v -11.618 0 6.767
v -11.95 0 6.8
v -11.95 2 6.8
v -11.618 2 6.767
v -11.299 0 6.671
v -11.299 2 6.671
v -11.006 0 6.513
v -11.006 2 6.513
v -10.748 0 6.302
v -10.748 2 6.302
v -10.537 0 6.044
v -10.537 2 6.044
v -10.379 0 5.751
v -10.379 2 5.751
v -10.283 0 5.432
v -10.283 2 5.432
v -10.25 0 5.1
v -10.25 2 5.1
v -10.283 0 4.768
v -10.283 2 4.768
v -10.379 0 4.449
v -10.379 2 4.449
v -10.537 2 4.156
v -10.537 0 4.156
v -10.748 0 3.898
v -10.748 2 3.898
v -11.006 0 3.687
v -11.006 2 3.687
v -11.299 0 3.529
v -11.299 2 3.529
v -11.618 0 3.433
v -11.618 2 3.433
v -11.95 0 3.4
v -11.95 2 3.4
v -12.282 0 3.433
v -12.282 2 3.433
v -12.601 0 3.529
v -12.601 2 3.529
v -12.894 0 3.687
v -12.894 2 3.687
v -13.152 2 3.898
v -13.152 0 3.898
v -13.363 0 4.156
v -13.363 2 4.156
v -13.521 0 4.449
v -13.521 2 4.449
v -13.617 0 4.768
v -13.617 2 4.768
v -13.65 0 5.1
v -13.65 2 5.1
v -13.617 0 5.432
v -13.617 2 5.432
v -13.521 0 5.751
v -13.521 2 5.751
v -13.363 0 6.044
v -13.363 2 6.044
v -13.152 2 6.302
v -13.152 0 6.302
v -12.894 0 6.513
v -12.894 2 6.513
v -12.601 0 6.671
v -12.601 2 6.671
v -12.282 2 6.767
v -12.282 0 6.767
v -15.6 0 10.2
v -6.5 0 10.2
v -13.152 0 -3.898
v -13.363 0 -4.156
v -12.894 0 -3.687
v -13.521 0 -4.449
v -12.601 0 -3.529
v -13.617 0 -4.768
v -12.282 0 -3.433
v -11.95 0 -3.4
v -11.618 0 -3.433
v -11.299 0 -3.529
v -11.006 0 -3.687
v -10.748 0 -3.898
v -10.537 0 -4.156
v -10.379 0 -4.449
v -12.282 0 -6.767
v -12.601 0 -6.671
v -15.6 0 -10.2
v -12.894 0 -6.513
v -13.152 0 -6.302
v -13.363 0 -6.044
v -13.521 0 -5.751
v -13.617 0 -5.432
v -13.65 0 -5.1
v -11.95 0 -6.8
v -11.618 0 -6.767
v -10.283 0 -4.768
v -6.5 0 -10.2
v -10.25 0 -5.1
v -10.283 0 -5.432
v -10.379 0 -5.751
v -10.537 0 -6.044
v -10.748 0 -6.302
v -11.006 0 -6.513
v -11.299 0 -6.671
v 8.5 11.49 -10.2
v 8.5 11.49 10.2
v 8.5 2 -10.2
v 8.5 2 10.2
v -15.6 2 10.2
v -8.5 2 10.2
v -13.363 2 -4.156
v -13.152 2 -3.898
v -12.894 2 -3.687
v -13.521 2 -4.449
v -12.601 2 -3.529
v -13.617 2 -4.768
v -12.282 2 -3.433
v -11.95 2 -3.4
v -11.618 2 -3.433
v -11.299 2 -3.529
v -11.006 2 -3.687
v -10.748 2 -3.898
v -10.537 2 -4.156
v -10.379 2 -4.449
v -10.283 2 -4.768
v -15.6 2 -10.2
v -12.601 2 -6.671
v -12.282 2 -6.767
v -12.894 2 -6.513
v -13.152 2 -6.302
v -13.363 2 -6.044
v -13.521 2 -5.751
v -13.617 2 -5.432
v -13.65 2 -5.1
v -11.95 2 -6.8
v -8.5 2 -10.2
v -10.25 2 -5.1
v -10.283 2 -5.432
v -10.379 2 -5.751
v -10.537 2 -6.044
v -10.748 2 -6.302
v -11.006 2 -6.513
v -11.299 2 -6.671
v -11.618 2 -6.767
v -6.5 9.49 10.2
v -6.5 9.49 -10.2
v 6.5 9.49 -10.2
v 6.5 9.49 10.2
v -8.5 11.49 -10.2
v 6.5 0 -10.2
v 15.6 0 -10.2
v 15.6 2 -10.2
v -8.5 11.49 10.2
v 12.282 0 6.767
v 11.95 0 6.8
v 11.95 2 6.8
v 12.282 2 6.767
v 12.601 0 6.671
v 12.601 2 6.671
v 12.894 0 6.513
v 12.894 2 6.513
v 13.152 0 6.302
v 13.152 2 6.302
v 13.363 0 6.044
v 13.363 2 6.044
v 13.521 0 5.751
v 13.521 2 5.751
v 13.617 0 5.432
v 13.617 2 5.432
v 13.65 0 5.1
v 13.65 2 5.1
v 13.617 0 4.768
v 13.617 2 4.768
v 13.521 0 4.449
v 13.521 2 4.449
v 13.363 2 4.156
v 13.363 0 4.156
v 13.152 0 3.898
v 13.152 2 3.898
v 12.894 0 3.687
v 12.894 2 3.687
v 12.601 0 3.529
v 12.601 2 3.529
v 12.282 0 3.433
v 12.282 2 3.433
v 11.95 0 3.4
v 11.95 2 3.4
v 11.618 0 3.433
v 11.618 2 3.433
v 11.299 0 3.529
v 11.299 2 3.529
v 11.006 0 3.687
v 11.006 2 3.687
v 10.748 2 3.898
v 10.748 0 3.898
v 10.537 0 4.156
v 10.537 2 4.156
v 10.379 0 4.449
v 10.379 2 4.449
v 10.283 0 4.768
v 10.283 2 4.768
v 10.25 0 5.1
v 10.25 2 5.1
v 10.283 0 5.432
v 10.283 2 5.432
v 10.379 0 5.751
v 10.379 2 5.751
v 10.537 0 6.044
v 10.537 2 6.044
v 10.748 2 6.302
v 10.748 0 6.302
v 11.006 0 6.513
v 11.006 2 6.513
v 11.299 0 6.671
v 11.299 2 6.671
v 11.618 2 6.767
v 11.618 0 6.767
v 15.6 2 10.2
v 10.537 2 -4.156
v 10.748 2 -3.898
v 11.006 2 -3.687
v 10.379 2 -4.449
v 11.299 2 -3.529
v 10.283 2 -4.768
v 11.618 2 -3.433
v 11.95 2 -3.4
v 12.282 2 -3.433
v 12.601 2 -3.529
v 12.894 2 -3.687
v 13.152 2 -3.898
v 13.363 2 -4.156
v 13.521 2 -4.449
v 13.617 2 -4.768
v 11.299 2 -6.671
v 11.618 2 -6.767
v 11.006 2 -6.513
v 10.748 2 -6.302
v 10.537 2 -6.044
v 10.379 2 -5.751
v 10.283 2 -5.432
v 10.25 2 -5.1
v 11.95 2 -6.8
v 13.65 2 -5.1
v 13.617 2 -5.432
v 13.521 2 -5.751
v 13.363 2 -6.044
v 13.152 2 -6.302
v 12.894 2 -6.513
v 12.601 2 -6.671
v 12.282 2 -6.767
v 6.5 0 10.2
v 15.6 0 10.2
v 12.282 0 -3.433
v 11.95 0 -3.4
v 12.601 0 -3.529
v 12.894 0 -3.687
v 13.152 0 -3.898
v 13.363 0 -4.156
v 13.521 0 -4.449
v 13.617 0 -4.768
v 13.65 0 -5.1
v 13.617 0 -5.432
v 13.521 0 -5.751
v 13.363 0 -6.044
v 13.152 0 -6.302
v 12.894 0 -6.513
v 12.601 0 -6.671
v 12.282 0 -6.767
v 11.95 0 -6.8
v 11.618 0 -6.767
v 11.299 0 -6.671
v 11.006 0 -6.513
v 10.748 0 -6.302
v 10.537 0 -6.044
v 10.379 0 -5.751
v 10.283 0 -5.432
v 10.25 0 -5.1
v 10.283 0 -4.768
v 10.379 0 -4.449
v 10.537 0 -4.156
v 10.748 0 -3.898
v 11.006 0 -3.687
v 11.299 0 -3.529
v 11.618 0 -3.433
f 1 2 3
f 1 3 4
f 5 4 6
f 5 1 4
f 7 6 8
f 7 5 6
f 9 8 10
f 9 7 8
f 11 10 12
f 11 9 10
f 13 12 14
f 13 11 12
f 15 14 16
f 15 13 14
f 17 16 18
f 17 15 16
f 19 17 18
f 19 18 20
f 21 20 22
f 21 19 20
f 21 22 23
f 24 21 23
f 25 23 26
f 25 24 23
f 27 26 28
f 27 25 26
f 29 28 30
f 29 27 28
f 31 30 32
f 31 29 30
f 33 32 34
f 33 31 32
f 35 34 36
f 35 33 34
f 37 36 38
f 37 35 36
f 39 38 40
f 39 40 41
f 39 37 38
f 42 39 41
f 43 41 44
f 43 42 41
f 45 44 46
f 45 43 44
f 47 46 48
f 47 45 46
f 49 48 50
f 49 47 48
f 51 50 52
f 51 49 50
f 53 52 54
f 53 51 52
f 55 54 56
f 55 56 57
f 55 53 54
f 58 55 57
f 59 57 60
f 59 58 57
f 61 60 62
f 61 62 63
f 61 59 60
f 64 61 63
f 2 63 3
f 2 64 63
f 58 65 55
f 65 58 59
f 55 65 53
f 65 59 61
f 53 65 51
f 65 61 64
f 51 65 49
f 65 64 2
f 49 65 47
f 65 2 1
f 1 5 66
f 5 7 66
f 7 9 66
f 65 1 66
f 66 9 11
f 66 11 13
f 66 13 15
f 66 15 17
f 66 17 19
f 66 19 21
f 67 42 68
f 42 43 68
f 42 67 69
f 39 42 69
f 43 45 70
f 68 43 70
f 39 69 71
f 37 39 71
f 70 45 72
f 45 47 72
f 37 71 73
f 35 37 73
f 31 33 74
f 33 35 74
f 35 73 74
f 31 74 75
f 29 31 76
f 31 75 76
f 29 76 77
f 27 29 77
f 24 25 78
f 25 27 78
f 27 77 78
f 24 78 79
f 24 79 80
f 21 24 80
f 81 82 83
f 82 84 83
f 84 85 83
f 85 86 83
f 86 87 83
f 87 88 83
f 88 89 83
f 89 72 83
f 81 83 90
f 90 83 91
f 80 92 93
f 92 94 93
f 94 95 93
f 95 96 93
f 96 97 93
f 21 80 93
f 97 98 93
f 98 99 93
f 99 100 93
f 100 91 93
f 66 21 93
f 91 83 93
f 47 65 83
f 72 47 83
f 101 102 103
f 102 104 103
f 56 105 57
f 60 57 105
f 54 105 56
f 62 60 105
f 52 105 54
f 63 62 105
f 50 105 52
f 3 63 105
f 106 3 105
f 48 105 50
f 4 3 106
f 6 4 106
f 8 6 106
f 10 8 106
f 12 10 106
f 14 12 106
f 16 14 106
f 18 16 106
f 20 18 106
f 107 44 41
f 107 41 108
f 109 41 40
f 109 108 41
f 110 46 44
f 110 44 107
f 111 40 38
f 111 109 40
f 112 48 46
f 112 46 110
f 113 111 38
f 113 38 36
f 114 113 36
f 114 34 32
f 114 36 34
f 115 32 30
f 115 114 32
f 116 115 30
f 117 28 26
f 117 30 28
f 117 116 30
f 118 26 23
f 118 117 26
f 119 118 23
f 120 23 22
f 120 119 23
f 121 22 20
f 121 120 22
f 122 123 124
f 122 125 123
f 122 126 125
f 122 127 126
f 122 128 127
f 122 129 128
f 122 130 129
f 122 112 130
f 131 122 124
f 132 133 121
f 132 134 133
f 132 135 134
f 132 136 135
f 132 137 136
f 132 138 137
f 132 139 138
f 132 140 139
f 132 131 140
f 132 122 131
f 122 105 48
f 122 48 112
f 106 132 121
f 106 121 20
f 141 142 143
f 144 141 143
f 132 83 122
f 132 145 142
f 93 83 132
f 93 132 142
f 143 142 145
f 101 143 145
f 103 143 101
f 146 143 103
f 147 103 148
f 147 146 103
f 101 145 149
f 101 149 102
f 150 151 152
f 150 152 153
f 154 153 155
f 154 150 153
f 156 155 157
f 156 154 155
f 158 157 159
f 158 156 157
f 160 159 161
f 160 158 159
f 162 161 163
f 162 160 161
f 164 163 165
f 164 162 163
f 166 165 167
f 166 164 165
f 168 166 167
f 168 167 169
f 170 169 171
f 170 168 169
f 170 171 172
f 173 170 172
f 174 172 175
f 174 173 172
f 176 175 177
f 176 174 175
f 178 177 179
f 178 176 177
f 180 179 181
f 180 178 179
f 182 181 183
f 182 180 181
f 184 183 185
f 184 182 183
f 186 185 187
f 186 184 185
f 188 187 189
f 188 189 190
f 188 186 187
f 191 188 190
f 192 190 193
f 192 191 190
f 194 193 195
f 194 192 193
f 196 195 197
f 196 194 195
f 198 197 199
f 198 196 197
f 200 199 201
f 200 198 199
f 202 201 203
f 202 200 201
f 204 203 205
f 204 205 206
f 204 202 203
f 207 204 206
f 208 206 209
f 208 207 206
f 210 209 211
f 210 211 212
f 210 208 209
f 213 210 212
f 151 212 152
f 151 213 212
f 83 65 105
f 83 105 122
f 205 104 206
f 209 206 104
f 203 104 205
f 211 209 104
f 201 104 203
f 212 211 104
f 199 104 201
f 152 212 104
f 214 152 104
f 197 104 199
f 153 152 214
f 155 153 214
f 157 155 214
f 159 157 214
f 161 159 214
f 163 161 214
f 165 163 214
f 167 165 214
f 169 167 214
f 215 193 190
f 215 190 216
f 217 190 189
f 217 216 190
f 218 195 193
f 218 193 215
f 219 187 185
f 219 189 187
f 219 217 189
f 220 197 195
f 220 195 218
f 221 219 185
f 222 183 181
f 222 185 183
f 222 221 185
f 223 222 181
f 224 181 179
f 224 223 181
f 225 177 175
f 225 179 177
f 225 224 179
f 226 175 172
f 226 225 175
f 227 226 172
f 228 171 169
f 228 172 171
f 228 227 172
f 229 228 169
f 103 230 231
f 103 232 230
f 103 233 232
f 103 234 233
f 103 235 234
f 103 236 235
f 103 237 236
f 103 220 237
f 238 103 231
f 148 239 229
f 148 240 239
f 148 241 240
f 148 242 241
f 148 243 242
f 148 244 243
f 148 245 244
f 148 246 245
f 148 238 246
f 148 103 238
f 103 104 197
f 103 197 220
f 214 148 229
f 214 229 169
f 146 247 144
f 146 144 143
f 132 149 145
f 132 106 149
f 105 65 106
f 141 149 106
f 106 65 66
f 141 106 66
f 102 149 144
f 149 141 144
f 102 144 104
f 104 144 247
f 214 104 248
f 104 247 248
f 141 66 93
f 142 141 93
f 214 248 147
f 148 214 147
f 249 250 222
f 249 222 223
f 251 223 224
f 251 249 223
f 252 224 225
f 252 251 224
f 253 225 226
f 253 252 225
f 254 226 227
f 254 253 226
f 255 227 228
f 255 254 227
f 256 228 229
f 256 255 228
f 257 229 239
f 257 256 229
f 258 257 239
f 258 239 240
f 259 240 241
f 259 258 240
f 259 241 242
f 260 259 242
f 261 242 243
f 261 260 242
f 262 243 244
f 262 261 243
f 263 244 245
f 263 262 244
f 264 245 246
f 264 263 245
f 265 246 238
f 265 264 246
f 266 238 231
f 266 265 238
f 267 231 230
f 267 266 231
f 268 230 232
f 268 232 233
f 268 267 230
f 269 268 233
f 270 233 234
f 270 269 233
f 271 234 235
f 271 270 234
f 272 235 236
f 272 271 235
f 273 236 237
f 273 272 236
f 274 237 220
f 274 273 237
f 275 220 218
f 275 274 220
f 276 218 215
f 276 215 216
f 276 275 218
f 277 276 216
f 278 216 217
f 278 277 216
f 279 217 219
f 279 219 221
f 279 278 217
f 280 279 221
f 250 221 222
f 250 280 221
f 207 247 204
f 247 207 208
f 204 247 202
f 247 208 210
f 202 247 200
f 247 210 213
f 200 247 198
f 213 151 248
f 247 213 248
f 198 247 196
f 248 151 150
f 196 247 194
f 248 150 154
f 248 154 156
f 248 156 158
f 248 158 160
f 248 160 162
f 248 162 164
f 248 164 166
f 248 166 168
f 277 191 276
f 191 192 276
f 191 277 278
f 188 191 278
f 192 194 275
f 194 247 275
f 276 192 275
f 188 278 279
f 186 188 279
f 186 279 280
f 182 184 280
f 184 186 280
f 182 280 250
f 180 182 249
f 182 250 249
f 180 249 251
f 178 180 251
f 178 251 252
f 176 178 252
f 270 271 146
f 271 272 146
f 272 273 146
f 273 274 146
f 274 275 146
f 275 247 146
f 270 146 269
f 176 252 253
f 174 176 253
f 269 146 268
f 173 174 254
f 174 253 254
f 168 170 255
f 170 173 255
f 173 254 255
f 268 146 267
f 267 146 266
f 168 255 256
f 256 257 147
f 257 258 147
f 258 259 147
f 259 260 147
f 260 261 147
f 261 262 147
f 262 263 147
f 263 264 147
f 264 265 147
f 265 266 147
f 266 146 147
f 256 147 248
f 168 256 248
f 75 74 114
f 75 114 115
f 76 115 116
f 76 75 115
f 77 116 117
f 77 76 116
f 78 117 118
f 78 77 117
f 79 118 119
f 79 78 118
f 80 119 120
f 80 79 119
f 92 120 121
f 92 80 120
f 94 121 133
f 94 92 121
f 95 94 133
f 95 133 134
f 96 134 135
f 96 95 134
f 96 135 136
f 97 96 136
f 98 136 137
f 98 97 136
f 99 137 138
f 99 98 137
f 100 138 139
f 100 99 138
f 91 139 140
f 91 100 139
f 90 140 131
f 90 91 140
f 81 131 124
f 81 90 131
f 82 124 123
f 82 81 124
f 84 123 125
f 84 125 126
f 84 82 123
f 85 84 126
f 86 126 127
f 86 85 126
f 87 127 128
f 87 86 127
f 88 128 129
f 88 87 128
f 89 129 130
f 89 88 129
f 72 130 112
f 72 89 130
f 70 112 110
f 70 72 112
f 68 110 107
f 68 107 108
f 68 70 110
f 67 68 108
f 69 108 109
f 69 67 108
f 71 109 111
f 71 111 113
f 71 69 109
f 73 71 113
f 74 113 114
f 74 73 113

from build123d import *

# Parameters (mm, degrees)
SKETCH1_W             = 9.1
SKETCH1_H             = 20.4
SKETCH1_R             = 1.7
BOSS_EXTRUDE1_DEPTH   = 2
BOSS_EXTRUDE1_2_DEPTH = 2
SKETCH2_W             = 2
SKETCH2_H             = 20.4
BOSS_EXTRUDE2_DEPTH   = 9.49
SKETCH3_W             = 17
SKETCH3_H             = 20.4
BOSS_EXTRUDE3_DEPTH   = 2


with BuildPart() as part:
    # Sketch1 → Boss-Extrude1 (new body)
    with BuildSketch(Plane(origin=(0, 0, 0), x_dir=(1, 0, 0), z_dir=(0, 1, 0))):
        with Locations((-11.05, 0)):
            Rectangle(SKETCH1_W, SKETCH1_H)
        with Locations(Location((-11.95, -5.1, 0), (0, 0, 270))):
            Circle(SKETCH1_R, mode=Mode.SUBTRACT)
        with Locations(Location((-11.95, 5.1, 0), (0, 0, 270))):
            Circle(SKETCH1_R, mode=Mode.SUBTRACT)
    extrude(amount=BOSS_EXTRUDE1_DEPTH)



with BuildPart() as body_2:
    # Sketch1 → Boss-Extrude1 2 (new body)
    with BuildSketch(Plane(origin=(0, 0, 0), x_dir=(1, 0, 0), z_dir=(0, 1, 0))):
        with Locations((11.05, 0)):
            Rectangle(SKETCH1_W, SKETCH1_H)
        with Locations(Location((11.95, -5.1, 0), (0, 0, 270))):
            Circle(SKETCH1_R, mode=Mode.SUBTRACT)
        with Locations(Location((11.95, 5.1, 0), (0, 0, 270))):
            Circle(SKETCH1_R, mode=Mode.SUBTRACT)
    extrude(amount=BOSS_EXTRUDE1_2_DEPTH)


with BuildPart() as part_1:
    add(part.part)

    add(body_2.part)  # Boss-Extrude2 merges body 2
    # Sketch2 → Boss-Extrude2 (add)
    with BuildSketch(Plane(origin=(0, 0, 0), x_dir=(1, 0, 0), z_dir=(0, 1, 0))):
        with Locations((-7.5, 0)):
            Rectangle(SKETCH2_W, SKETCH2_H)
        with Locations((7.5, 0)):
            Rectangle(SKETCH2_W, SKETCH2_H)
    extrude(amount=BOSS_EXTRUDE2_DEPTH)

    # Sketch3 → Boss-Extrude3 (add)
    with BuildSketch(Plane(origin=(0, 9.49, 0), x_dir=(1, 0, 0), z_dir=(0, 1, 0))):
        Rectangle(SKETCH3_W, SKETCH3_H)
    extrude(amount=BOSS_EXTRUDE3_DEPTH)


solid = part_1.part
